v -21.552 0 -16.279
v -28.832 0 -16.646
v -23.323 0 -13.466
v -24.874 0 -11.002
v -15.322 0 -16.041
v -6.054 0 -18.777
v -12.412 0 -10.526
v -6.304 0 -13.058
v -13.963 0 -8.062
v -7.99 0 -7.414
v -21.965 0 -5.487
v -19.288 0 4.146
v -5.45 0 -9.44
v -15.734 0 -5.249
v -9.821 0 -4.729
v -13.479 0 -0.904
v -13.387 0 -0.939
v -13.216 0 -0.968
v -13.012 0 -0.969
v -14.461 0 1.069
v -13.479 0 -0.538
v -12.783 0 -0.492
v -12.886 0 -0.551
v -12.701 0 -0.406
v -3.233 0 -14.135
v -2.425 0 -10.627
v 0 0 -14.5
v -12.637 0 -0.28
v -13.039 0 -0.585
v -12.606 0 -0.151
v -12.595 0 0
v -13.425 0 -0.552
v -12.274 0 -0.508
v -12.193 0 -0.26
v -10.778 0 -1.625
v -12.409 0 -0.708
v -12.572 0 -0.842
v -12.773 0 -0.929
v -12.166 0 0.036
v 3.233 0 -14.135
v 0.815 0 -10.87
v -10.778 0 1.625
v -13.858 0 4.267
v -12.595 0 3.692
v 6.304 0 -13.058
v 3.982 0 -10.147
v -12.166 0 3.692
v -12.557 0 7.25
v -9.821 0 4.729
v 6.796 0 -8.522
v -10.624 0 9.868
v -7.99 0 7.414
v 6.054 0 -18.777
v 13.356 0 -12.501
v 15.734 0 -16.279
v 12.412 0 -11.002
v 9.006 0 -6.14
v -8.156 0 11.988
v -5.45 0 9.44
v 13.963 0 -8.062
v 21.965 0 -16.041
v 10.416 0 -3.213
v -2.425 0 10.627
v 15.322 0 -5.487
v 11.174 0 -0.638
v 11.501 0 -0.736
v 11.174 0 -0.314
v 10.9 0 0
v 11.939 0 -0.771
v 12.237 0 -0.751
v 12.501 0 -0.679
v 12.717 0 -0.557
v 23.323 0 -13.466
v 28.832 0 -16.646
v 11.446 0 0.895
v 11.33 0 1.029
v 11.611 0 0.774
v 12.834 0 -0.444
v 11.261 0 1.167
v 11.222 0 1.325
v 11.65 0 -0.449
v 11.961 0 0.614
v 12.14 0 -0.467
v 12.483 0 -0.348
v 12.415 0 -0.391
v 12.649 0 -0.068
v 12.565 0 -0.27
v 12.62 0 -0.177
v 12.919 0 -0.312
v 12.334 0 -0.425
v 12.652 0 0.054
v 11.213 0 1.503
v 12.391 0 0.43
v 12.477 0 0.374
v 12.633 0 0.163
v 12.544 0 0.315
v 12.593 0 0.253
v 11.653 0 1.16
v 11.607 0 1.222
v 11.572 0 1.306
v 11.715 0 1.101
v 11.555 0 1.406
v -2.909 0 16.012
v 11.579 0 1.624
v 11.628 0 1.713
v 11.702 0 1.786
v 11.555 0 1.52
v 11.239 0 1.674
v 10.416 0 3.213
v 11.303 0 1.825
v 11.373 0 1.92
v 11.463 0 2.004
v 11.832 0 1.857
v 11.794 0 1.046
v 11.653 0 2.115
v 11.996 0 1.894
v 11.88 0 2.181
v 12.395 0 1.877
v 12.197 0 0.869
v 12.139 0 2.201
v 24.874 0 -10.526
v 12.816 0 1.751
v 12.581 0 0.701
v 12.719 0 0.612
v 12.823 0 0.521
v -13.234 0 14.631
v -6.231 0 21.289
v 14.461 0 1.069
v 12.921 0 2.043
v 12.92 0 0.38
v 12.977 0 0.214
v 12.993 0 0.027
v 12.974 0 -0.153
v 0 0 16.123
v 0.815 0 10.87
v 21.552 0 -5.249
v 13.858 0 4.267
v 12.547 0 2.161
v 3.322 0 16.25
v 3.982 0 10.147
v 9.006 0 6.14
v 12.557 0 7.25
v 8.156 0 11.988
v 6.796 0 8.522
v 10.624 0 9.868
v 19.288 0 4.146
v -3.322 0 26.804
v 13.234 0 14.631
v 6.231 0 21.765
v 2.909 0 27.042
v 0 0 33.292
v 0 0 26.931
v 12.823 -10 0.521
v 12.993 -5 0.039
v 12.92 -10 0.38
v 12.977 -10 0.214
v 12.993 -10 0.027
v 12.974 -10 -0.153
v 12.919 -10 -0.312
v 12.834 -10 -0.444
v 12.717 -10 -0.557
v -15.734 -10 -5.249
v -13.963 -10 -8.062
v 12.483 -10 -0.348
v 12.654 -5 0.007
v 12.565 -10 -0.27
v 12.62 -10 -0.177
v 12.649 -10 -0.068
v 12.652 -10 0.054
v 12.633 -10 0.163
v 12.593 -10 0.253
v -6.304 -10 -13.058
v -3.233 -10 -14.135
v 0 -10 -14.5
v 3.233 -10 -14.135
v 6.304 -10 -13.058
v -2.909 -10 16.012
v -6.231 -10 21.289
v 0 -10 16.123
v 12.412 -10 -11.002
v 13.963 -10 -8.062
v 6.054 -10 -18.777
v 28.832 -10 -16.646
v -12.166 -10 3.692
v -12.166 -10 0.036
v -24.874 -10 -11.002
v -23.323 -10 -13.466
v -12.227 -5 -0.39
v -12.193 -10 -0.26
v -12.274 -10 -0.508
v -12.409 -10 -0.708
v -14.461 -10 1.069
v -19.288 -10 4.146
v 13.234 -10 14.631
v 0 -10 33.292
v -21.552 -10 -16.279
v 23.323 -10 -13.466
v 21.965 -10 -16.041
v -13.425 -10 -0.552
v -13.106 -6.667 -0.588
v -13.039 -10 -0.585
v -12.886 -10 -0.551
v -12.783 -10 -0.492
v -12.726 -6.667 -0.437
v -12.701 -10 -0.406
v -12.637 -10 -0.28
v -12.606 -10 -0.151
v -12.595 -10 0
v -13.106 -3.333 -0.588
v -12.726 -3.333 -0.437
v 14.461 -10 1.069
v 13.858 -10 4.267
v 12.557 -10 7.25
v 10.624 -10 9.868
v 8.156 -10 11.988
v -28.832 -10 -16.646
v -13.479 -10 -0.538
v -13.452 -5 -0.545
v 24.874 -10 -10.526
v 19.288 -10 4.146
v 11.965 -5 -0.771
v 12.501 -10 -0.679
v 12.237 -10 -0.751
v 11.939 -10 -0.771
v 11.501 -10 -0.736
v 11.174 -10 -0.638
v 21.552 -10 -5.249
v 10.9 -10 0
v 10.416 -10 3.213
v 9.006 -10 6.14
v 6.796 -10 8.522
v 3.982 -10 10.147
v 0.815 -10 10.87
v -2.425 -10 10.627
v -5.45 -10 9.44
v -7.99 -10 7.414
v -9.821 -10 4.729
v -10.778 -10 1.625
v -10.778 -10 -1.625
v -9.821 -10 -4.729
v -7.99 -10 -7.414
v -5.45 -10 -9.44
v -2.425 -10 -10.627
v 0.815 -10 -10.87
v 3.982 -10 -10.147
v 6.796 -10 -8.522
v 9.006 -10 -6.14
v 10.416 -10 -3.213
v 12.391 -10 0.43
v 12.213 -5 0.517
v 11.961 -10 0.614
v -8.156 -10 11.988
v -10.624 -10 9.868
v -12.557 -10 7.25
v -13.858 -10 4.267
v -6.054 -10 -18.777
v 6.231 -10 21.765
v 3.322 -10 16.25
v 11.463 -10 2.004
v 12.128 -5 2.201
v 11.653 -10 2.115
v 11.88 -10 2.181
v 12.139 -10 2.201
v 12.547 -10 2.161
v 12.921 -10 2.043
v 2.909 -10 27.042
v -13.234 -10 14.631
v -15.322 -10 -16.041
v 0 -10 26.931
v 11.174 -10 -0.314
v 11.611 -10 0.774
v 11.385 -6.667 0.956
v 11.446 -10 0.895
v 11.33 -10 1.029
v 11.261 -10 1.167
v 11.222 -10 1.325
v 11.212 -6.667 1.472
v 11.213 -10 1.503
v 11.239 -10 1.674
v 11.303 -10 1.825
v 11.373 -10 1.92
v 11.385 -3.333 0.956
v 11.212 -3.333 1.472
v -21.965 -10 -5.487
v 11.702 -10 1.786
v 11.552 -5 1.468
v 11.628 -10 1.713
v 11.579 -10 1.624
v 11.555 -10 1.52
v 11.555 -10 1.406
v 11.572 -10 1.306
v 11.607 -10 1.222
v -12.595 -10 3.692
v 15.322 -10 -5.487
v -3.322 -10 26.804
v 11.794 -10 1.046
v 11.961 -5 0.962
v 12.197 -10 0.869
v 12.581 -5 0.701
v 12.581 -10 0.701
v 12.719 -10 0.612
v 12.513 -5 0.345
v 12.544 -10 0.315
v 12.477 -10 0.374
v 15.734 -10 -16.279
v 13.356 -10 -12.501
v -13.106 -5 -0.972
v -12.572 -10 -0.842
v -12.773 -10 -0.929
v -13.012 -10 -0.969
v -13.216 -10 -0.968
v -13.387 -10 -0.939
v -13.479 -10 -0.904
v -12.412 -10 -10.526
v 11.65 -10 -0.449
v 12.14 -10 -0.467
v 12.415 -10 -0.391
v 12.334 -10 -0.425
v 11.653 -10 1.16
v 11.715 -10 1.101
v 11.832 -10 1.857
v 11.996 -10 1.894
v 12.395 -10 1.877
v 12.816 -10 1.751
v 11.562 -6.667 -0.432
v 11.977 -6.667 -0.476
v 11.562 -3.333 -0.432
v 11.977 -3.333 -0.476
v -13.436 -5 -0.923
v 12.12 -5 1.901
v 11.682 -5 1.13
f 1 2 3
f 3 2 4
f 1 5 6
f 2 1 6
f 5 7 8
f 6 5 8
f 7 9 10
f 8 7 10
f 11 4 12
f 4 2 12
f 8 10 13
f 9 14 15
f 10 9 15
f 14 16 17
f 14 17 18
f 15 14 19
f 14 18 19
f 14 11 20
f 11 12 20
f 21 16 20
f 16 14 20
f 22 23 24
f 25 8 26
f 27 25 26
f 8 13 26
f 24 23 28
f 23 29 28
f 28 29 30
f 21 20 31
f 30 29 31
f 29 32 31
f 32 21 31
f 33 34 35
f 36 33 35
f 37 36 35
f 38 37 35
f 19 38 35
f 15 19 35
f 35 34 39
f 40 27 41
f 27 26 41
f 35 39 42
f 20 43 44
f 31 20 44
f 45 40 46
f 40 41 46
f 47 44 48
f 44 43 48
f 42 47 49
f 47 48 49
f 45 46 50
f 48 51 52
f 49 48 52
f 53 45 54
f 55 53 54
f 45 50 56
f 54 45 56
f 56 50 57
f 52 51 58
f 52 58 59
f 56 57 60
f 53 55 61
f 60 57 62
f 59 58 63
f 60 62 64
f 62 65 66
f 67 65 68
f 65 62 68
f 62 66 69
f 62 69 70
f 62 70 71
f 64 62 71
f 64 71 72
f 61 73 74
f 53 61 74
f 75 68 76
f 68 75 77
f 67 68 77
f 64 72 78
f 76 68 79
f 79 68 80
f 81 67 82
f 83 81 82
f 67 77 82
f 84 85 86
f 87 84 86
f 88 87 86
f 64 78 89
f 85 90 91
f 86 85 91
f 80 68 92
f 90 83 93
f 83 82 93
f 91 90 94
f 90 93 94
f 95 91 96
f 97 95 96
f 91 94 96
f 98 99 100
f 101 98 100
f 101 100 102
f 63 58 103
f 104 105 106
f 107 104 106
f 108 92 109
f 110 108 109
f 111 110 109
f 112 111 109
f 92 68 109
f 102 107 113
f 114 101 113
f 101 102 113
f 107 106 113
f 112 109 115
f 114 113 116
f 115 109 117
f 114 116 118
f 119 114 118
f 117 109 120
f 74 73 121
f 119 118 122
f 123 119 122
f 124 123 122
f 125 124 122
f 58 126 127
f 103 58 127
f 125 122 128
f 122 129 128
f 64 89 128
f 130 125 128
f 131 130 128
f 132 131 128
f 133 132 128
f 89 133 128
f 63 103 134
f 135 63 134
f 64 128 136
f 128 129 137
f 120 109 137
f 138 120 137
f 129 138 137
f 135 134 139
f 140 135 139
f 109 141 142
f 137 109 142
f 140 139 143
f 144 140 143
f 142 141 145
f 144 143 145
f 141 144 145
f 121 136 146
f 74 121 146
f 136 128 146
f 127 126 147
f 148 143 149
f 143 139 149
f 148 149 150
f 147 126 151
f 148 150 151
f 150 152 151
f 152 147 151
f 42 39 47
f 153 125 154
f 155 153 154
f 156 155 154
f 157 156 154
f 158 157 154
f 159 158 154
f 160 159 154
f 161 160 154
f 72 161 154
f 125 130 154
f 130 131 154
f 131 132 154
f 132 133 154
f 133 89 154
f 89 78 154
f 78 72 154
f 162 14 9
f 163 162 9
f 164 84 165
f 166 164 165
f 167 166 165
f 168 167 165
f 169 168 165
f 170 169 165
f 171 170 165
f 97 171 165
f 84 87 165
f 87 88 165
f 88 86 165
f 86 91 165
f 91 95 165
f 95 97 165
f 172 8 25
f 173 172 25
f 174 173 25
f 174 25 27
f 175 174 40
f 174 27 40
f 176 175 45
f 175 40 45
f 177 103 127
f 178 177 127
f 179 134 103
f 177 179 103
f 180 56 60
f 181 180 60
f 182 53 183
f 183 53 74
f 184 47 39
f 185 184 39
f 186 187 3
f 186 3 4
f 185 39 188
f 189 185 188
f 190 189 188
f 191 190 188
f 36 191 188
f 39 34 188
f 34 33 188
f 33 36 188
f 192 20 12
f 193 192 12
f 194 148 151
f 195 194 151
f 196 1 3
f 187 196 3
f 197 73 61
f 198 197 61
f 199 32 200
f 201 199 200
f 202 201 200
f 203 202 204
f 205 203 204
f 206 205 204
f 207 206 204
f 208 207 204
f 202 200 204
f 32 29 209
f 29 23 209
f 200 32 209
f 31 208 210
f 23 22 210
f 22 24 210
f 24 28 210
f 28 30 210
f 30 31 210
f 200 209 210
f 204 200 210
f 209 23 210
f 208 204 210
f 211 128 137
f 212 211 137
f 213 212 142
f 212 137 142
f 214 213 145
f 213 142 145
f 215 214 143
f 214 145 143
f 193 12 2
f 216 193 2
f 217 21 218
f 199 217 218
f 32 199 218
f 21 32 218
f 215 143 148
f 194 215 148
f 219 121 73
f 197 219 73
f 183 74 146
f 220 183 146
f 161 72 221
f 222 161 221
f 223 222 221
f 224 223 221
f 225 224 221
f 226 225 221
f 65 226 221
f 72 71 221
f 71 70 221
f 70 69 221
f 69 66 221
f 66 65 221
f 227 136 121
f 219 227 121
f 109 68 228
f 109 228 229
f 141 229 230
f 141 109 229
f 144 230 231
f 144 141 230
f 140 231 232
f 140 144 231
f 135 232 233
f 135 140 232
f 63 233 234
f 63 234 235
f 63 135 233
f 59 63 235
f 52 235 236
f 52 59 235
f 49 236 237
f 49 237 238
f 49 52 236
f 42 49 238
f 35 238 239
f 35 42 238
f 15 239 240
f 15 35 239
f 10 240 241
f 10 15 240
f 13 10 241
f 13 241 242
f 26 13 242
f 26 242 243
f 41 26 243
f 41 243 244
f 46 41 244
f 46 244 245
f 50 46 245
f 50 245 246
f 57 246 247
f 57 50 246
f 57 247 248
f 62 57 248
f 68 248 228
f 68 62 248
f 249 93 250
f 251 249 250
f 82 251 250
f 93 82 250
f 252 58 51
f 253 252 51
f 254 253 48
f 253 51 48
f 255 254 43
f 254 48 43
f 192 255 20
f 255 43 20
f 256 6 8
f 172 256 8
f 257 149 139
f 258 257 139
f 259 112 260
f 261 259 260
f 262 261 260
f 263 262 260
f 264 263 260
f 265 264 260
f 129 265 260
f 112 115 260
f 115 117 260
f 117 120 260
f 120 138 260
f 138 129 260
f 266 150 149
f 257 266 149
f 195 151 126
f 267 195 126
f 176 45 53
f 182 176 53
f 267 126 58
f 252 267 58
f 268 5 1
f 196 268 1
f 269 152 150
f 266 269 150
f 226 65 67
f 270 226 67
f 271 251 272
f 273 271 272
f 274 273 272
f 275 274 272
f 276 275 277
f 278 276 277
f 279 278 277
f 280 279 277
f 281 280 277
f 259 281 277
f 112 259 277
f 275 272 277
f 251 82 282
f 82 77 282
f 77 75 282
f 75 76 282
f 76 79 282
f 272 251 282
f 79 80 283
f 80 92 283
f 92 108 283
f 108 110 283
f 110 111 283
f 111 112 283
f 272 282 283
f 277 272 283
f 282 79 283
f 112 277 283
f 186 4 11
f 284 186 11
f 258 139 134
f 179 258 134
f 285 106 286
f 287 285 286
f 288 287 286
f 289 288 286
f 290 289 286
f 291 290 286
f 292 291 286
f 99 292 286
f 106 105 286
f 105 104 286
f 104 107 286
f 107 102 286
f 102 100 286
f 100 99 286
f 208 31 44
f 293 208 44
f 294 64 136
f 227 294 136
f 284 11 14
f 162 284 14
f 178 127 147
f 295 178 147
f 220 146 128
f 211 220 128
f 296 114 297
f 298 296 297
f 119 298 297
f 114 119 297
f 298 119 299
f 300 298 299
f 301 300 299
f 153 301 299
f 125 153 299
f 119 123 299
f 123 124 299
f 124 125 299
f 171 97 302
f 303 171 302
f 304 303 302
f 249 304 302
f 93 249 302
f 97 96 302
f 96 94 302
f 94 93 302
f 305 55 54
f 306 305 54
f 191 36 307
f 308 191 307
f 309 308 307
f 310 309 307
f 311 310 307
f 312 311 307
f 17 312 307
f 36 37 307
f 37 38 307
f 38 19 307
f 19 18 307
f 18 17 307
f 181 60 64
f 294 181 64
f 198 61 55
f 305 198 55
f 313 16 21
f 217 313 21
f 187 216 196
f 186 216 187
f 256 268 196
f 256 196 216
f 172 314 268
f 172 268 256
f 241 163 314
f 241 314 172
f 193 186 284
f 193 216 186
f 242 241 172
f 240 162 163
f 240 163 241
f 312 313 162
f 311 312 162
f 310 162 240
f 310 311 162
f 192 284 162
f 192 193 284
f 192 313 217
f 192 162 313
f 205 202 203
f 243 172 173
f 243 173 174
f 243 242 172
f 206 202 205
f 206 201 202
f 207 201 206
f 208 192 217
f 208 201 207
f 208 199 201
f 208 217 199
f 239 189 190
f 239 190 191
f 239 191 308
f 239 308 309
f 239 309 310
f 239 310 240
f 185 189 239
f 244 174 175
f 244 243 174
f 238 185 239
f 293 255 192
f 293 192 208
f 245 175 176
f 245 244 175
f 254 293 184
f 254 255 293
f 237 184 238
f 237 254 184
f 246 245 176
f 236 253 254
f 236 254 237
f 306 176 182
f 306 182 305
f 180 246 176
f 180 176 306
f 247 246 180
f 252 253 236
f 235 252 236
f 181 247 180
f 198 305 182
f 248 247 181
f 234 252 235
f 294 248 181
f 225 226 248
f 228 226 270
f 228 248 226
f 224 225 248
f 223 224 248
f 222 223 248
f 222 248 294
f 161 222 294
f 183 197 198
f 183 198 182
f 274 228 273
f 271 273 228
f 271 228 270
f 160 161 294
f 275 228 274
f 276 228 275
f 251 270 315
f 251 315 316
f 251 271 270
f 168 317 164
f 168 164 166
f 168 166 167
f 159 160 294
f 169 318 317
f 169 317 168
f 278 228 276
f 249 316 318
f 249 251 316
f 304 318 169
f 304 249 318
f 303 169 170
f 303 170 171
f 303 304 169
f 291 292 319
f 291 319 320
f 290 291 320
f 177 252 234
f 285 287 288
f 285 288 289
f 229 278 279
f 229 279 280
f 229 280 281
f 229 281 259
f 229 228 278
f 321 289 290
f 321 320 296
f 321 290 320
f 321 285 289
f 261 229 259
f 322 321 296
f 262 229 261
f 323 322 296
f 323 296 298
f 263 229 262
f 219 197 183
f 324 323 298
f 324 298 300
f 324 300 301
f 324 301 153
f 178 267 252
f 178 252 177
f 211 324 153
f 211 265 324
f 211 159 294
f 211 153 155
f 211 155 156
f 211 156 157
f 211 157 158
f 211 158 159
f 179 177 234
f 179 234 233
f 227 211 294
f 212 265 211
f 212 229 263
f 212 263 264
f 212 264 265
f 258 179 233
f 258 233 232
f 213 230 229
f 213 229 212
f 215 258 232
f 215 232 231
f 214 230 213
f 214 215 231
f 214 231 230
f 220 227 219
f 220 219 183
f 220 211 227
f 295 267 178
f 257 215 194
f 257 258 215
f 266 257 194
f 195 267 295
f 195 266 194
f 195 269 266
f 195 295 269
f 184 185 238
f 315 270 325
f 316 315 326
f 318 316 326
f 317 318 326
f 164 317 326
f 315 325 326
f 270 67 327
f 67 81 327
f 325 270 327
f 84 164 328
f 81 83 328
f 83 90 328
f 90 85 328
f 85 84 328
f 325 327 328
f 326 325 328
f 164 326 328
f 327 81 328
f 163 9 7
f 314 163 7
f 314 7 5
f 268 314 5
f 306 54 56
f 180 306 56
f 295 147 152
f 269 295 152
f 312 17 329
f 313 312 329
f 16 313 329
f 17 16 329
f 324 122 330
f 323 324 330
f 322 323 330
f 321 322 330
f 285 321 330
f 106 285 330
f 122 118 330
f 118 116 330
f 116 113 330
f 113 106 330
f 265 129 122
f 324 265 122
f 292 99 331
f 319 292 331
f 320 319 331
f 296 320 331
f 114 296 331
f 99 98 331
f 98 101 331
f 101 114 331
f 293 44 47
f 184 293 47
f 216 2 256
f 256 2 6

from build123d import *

# Parameters (mm, degrees)
F0_R     = 10.9
F1_DEPTH = 10


with BuildPart() as f1:
    # F0 (on Front) → F1 (new body)
    with BuildSketch(Plane.XZ):
        with BuildLine():
            Line((7.174170576, 11.477349326), (0.5159462476, 14.490817764))
            ThreePointArc((0.5159462476, 14.490817764), (0.2580139744, 14.4977042593), (0, 14.5))
            ThreePointArc((0, 14.5), (-0.2580139744, 14.4977042593), (-0.5159462476, 14.490817764))
            Line((-0.5159462476, 14.490817764), (-7.174170576, 11.477349326))
            Line((-7.174170576, 11.477349326), (-8.1563723499, 11.9884773883))
            ThreePointArc((-8.1563723499, 11.9884773883), (-12.5573683549, 7.25), (-14.4605121459, 1.0693869636))
            Line((-14.4605121459, 1.0693869636), (-13.5267613725, 0.4743393069))
            Line((-13.5267613725, 0.4743393069), (-13.4252365556, -0.5520872158))
            add(Edge.make_bspline(
                [(-13.4252365556, -0.5520872158), (-13.2709471232, -0.5882615523), (-13.1061554641, -0.5882615523)],
                knots=[0.1502622758, 0.1502622758, 0.1502622758, 1, 1, 1], degree=2))
            add(Edge.make_bspline(
                [(-13.1061554641, -0.5882615523), (-12.8556594734, -0.5882615523), (-12.7255631686, -0.4367518805)],
                knots=[0, 0, 0, 1, 1, 1], degree=2))
            add(Edge.make_bspline(
                [(-12.7255631686, -0.4367518805), (-12.5954668638, -0.2852422087), (-12.5954668638, 0)],
                knots=[0, 0, 0, 1, 1, 1], degree=2))
            Line((-12.5954668638, 0), (-12.5954668638, 3.6919876817))
            Line((-12.5954668638, 3.6919876817), (-12.1663914733, 3.6919876817))
            Line((-12.1663914733, 3.6919876817), (-12.1663914733, 0.0355542696))
            add(Edge.make_bspline(
                [(-12.1663914733, 0.0355542696), (-12.1663914733, -0.4444283705), (-12.4088069482, -0.7082572123)],
                knots=[0, 0, 0, 1, 1, 1], degree=2))
            add(Edge.make_bspline(
                [(-12.4088069482, -0.7082572123), (-12.651222423, -0.9720860541), (-13.1061554641, -0.9720860541)],
                knots=[0, 0, 0, 1, 1, 1], degree=2))
            add(Edge.make_bspline(
                [(-13.1061554641, -0.9720860541), (-13.2707647465, -0.9720860541), (-13.386939397, -0.9392754971)],
                knots=[0, 0, 0, 0.6952605952, 0.6952605952, 0.6952605952], degree=2))
            Line((-13.386939397, -0.9392754971), (-12.807389429, -6.7985863246))
            ThreePointArc((-12.807389429, -6.7985863246), (-12.6843871723, -7.0254054733), (-12.5573683549, -7.25))
            ThreePointArc((-12.5573683549, -7.25), (-12.4263731979, -7.472298786), (-12.2914431814, -7.6922314394))
            Line((-12.2914431814, -7.6922314394), (-6.3525907964, -11.9516886329))
            Line((-6.3525907964, -11.9516886329), (-6.304139796, -13.0578643519))
            ThreePointArc((-6.304139796, -13.0578643519), (0, -14.5), (6.304139796, -13.0578643519))
            Line((6.304139796, -13.0578643519), (6.3525907964, -11.9516886329))
            Line((6.3525907964, -11.9516886329), (12.2914431814, -7.6922314394))
            ThreePointArc((12.2914431814, -7.6922314394), (12.4263731979, -7.472298786), (12.5573683549, -7.25))
            ThreePointArc((12.5573683549, -7.25), (12.6843871723, -7.0254054733), (12.807389429, -6.7985863246))
            Line((12.807389429, -6.7985863246), (13.5267613725, 0.4743393069))
            Line((13.5267613725, 0.4743393069), (14.4605121459, 1.0693869636))
            ThreePointArc((14.4605121459, 1.0693869636), (12.5573683549, 7.25), (8.1563723499, 11.9884773883))
            Line((8.1563723499, 11.9884773883), (7.174170576, 11.477349326))
        make_face()
        Circle(F0_R, mode=Mode.SUBTRACT)
        with BuildLine():
            add(Edge.make_bspline(
                [(12.8226079532, 0.5208683426), (12.9934544173, 0.3348355262), (12.9934544173, 0.0387016553)],
                knots=[0, 0, 0, 1, 1, 1], degree=2))
            add(Edge.make_bspline(
                [(12.9934544173, 0.0387016553), (12.9934544173, -0.3428554477), (12.7166198691, -0.55672991)],
                knots=[0, 0, 0, 1, 1, 1], degree=2))
            add(Edge.make_bspline(
                [(12.7166198691, -0.55672991), (12.4397853209, -0.7706043724), (11.9652118098, -0.7706043724)],
                knots=[0, 0, 0, 1, 1, 1], degree=2))
            add(Edge.make_bspline(
                [(11.9652118098, -0.7706043724), (11.4514068883, -0.7706043724), (11.1742559578, -0.6377237893)],
                knots=[0, 0, 0, 1, 1, 1], degree=2))
            Line((11.1742559578, -0.6377237893), (11.1742559578, -0.3137482723))
            add(Edge.make_bspline(
                [(11.1742559578, -0.3137482723), (11.352695598, -0.3884145048), (11.5621407076, -0.4320752678)],
                knots=[0, 0, 0, 1, 1, 1], degree=2))
            add(Edge.make_bspline(
                [(11.5621407076, -0.4320752678), (11.7715858172, -0.4757360308), (11.9772343387, -0.4757360308)],
                knots=[0, 0, 0, 1, 1, 1], degree=2))
            add(Edge.make_bspline(
                [(11.9772343387, -0.4757360308), (12.3132323846, -0.4757360308), (12.4834460839, -0.3482339475)],
                knots=[0, 0, 0, 1, 1, 1], degree=2))
            add(Edge.make_bspline(
                [(12.4834460839, -0.3482339475), (12.6536597833, -0.2207318641), (12.6536597833, 0.0070634212)],
                knots=[0, 0, 0, 1, 1, 1], degree=2))
            add(Edge.make_bspline(
                [(12.6536597833, 0.0070634212), (12.6536597833, 0.1570286507), (12.5932307562, 0.2528925)],
                knots=[0, 0, 0, 1, 1, 1], degree=2))
            add(Edge.make_bspline(
                [(12.5932307562, 0.2528925), (12.5328017291, 0.3487563492), (12.3913788228, 0.4300666108)],
                knots=[0, 0, 0, 1, 1, 1], degree=2))
            add(Edge.make_bspline(
                [(12.3913788228, 0.4300666108), (12.2499559164, 0.5113768724), (11.9614152217, 0.6138847508)],
                knots=[0, 0, 0, 1, 1, 1], degree=2))
            add(Edge.make_bspline(
                [(11.9614152217, 0.6138847508), (11.5583441195, 0.7581550982), (11.3852829791, 0.9558940612)],
                knots=[0, 0, 0, 1, 1, 1], degree=2))
            add(Edge.make_bspline(
                [(11.3852829791, 0.9558940612), (11.2122218387, 1.1536330242), (11.2122218387, 1.471913659)],
                knots=[0, 0, 0, 1, 1, 1], degree=2))
            add(Edge.make_bspline(
                [(11.2122218387, 1.471913659), (11.2122218387, 1.8060134108), (11.4631130349, 2.0037523738)],
                knots=[0, 0, 0, 1, 1, 1], degree=2))
            add(Edge.make_bspline(
                [(11.4631130349, 2.0037523738), (11.7140042312, 2.2014913368), (12.1278323329, 2.2014913368)],
                knots=[0, 0, 0, 1, 1, 1], degree=2))
            add(Edge.make_bspline(
                [(12.1278323329, 2.2014913368), (12.558745081, 2.2014913368), (12.9206864789, 2.0433001664)],
                knots=[0, 0, 0, 1, 1, 1], degree=2))
            Line((12.9206864789, 2.0433001664), (12.8156475417, 1.7509628835))
            add(Edge.make_bspline(
                [(12.8156475417, 1.7509628835), (12.457502732, 1.9009281131), (12.119606392, 1.9009281131)],
                knots=[0, 0, 0, 1, 1, 1], degree=2))
            add(Edge.make_bspline(
                [(12.119606392, 1.9009281131), (11.8525796964, 1.9009281131), (11.7022980846, 1.7863977057)],
                knots=[0, 0, 0, 1, 1, 1], degree=2))
            add(Edge.make_bspline(
                [(11.7022980846, 1.7863977057), (11.5520164727, 1.6718672983), (11.5520164727, 1.4681170709)],
                knots=[0, 0, 0, 1, 1, 1], degree=2))
            add(Edge.make_bspline(
                [(11.5520164727, 1.4681170709), (11.5520164727, 1.3181518414), (11.6073833823, 1.2219716098)],
                knots=[0, 0, 0, 1, 1, 1], degree=2))
            add(Edge.make_bspline(
                [(11.6073833823, 1.2219716098), (11.662750292, 1.1257913782), (11.7943653457, 1.045746646)],
                knots=[0, 0, 0, 1, 1, 1], degree=2))
            add(Edge.make_bspline(
                [(11.7943653457, 1.045746646), (11.9259803995, 0.9657019137), (12.1968036832, 0.8688889175)],
                knots=[0, 0, 0, 1, 1, 1], degree=2))
            add(Edge.make_bspline(
                [(12.1968036832, 0.8688889175), (12.6517614892, 0.706901159), (12.8226079532, 0.5208683426)],
                knots=[0, 0, 0, 1, 1, 1], degree=2))
        make_face(mode=Mode.SUBTRACT)
        with BuildLine():
            ThreePointArc((0, 14.5), (0.2580139744, 14.4977042593), (0.5159462476, 14.490817764))
            Line((0.5159462476, 14.490817764), (7.174170576, 11.477349326))
            Line((7.174170576, 11.477349326), (8.1563723499, 11.9884773883))
            Line((8.1563723499, 11.9884773883), (13.2344113663, 14.6310385317))
            Line((13.2344113663, 14.6310385317), (0, 33.292029053))
            Line((0, 33.292029053), (0, 26.9311823049))
            Line((0, 26.9311823049), (2.9092891492, 27.0423173629))
            Line((2.9092891492, 27.0423173629), (6.2308384028, 21.7652622603))
            Line((6.2308384028, 21.7652622603), (3.3215492536, 16.2501886755))
            Line((3.3215492536, 16.2501886755), (0, 16.1233052513))
            Line((0, 16.1233052513), (0, 14.5))
        make_face()
        with BuildLine():
            ThreePointArc((-0.5159462476, 14.490817764), (-0.2580139744, 14.4977042593), (0, 14.5))
            Line((0, 14.5), (0, 16.1233052513))
            Line((0, 16.1233052513), (-2.9092891492, 16.0121701933))
            Line((-2.9092891492, 16.0121701933), (-6.2308384028, 21.2892252959))
            Line((-6.2308384028, 21.2892252959), (-3.3215492536, 26.8042988807))
            Line((-3.3215492536, 26.8042988807), (0, 26.9311823049))
            Line((0, 26.9311823049), (0, 33.292029053))
            Line((0, 33.292029053), (-13.2344113663, 14.6310385317))
            Line((-13.2344113663, 14.6310385317), (-8.1563723499, 11.9884773883))
            Line((-8.1563723499, 11.9884773883), (-7.174170576, 11.477349326))
            Line((-7.174170576, 11.477349326), (-0.5159462476, 14.490817764))
        make_face()
        with BuildLine():
            Line((19.2880567353, 4.1458171815), (14.4605121459, 1.0693869636))
            Line((14.4605121459, 1.0693869636), (13.5267613725, 0.4743393069))
            Line((13.5267613725, 0.4743393069), (12.807389429, -6.7985863246))
            ThreePointArc((12.807389429, -6.7985863246), (12.6843871723, -7.0254054733), (12.5573683549, -7.25))
            Line((12.5573683549, -7.25), (13.9631919406, -8.0616526257))
            Line((13.9631919406, -8.0616526257), (15.3215907317, -5.4865667864))
            Line((15.3215907317, -5.4865667864), (21.5524291345, -5.2485483042))
            Line((21.5524291345, -5.2485483042), (24.8739783881, -10.5256034068))
            Line((24.8739783881, -10.5256034068), (23.32308803, -13.4655911524))
            Line((23.32308803, -13.4655911524), (28.8317429034, -16.6460145265))
            Line((28.8317429034, -16.6460145265), (19.2880567353, 4.1458171815))
        make_face()
        with BuildLine():
            Line((-13.5267613725, 0.4743393069), (-14.4605121459, 1.0693869636))
            Line((-14.4605121459, 1.0693869636), (-19.2880567353, 4.1458171815))
            Line((-19.2880567353, 4.1458171815), (-28.8317429034, -16.6460145265))
            Line((-28.8317429034, -16.6460145265), (-23.32308803, -13.4655911524))
            Line((-23.32308803, -13.4655911524), (-24.8739783881, -11.0016403713))
            Line((-24.8739783881, -11.0016403713), (-21.9646892389, -5.4865667864))
            Line((-21.9646892389, -5.4865667864), (-15.7338508361, -5.2485483042))
            Line((-15.7338508361, -5.2485483042), (-13.9631919406, -8.0616526257))
            Line((-13.9631919406, -8.0616526257), (-12.5573683549, -7.25))
            ThreePointArc((-12.5573683549, -7.25), (-12.6843871723, -7.0254054733), (-12.807389429, -6.7985863246))
            Line((-12.807389429, -6.7985863246), (-13.386939397, -0.9392754971))
            add(Edge.make_bspline(
                [(-13.386939397, -0.9392754971), (-13.4378598636, -0.9248943144), (-13.4794752953, -0.9042097211)],
                knots=[0.6952605952, 0.6952605952, 0.6952605952, 1, 1, 1], degree=2))
            Line((-13.4794752953, -0.9042097211), (-13.4794752953, -0.5381623541))
            add(Edge.make_bspline(
                [(-13.4794752953, -0.5381623541), (-13.4525201287, -0.5456903737), (-13.4252365556, -0.5520872158)],
                knots=[0, 0, 0, 0.1502622758, 0.1502622758, 0.1502622758], degree=2))
            Line((-13.4252365556, -0.5520872158), (-13.5267613725, 0.4743393069))
        make_face()
        with BuildLine():
            Line((6.053645369, -18.7768557132), (28.8317429034, -16.6460145265))
            Line((28.8317429034, -16.6460145265), (23.32308803, -13.4655911524))
            Line((23.32308803, -13.4655911524), (21.9646892389, -16.0406769917))
            Line((21.9646892389, -16.0406769917), (15.7338508361, -16.2786954739))
            Line((15.7338508361, -16.2786954739), (13.3561301342, -12.5011319924))
            Line((13.3561301342, -12.5011319924), (12.4123015825, -11.0016403713))
            Line((12.4123015825, -11.0016403713), (13.9631919406, -8.0616526257))
            Line((13.9631919406, -8.0616526257), (12.5573683549, -7.25))
            ThreePointArc((12.5573683549, -7.25), (12.4263731979, -7.472298786), (12.2914431814, -7.6922314394))
            Line((12.2914431814, -7.6922314394), (6.3525907964, -11.9516886329))
            Line((6.3525907964, -11.9516886329), (6.304139796, -13.0578643519))
            Line((6.304139796, -13.0578643519), (6.053645369, -18.7768557132))
        make_face()
        with BuildLine():
            Line((-23.32308803, -13.4655911524), (-28.8317429034, -16.6460145265))
            Line((-28.8317429034, -16.6460145265), (-6.053645369, -18.7768557132))
            Line((-6.053645369, -18.7768557132), (-6.304139796, -13.0578643519))
            Line((-6.304139796, -13.0578643519), (-6.3525907964, -11.9516886329))
            Line((-6.3525907964, -11.9516886329), (-12.2914431814, -7.6922314394))
            ThreePointArc((-12.2914431814, -7.6922314394), (-12.4263731979, -7.472298786), (-12.5573683549, -7.25))
            Line((-12.5573683549, -7.25), (-13.9631919406, -8.0616526257))
            Line((-13.9631919406, -8.0616526257), (-12.4123015825, -10.5256034068))
            Line((-12.4123015825, -10.5256034068), (-15.3215907317, -16.0406769917))
            Line((-15.3215907317, -16.0406769917), (-21.5524291345, -16.2786954739))
            Line((-21.5524291345, -16.2786954739), (-23.32308803, -13.4655911524))
        make_face()
    extrude(amount=F1_DEPTH)


solid = f1.part
